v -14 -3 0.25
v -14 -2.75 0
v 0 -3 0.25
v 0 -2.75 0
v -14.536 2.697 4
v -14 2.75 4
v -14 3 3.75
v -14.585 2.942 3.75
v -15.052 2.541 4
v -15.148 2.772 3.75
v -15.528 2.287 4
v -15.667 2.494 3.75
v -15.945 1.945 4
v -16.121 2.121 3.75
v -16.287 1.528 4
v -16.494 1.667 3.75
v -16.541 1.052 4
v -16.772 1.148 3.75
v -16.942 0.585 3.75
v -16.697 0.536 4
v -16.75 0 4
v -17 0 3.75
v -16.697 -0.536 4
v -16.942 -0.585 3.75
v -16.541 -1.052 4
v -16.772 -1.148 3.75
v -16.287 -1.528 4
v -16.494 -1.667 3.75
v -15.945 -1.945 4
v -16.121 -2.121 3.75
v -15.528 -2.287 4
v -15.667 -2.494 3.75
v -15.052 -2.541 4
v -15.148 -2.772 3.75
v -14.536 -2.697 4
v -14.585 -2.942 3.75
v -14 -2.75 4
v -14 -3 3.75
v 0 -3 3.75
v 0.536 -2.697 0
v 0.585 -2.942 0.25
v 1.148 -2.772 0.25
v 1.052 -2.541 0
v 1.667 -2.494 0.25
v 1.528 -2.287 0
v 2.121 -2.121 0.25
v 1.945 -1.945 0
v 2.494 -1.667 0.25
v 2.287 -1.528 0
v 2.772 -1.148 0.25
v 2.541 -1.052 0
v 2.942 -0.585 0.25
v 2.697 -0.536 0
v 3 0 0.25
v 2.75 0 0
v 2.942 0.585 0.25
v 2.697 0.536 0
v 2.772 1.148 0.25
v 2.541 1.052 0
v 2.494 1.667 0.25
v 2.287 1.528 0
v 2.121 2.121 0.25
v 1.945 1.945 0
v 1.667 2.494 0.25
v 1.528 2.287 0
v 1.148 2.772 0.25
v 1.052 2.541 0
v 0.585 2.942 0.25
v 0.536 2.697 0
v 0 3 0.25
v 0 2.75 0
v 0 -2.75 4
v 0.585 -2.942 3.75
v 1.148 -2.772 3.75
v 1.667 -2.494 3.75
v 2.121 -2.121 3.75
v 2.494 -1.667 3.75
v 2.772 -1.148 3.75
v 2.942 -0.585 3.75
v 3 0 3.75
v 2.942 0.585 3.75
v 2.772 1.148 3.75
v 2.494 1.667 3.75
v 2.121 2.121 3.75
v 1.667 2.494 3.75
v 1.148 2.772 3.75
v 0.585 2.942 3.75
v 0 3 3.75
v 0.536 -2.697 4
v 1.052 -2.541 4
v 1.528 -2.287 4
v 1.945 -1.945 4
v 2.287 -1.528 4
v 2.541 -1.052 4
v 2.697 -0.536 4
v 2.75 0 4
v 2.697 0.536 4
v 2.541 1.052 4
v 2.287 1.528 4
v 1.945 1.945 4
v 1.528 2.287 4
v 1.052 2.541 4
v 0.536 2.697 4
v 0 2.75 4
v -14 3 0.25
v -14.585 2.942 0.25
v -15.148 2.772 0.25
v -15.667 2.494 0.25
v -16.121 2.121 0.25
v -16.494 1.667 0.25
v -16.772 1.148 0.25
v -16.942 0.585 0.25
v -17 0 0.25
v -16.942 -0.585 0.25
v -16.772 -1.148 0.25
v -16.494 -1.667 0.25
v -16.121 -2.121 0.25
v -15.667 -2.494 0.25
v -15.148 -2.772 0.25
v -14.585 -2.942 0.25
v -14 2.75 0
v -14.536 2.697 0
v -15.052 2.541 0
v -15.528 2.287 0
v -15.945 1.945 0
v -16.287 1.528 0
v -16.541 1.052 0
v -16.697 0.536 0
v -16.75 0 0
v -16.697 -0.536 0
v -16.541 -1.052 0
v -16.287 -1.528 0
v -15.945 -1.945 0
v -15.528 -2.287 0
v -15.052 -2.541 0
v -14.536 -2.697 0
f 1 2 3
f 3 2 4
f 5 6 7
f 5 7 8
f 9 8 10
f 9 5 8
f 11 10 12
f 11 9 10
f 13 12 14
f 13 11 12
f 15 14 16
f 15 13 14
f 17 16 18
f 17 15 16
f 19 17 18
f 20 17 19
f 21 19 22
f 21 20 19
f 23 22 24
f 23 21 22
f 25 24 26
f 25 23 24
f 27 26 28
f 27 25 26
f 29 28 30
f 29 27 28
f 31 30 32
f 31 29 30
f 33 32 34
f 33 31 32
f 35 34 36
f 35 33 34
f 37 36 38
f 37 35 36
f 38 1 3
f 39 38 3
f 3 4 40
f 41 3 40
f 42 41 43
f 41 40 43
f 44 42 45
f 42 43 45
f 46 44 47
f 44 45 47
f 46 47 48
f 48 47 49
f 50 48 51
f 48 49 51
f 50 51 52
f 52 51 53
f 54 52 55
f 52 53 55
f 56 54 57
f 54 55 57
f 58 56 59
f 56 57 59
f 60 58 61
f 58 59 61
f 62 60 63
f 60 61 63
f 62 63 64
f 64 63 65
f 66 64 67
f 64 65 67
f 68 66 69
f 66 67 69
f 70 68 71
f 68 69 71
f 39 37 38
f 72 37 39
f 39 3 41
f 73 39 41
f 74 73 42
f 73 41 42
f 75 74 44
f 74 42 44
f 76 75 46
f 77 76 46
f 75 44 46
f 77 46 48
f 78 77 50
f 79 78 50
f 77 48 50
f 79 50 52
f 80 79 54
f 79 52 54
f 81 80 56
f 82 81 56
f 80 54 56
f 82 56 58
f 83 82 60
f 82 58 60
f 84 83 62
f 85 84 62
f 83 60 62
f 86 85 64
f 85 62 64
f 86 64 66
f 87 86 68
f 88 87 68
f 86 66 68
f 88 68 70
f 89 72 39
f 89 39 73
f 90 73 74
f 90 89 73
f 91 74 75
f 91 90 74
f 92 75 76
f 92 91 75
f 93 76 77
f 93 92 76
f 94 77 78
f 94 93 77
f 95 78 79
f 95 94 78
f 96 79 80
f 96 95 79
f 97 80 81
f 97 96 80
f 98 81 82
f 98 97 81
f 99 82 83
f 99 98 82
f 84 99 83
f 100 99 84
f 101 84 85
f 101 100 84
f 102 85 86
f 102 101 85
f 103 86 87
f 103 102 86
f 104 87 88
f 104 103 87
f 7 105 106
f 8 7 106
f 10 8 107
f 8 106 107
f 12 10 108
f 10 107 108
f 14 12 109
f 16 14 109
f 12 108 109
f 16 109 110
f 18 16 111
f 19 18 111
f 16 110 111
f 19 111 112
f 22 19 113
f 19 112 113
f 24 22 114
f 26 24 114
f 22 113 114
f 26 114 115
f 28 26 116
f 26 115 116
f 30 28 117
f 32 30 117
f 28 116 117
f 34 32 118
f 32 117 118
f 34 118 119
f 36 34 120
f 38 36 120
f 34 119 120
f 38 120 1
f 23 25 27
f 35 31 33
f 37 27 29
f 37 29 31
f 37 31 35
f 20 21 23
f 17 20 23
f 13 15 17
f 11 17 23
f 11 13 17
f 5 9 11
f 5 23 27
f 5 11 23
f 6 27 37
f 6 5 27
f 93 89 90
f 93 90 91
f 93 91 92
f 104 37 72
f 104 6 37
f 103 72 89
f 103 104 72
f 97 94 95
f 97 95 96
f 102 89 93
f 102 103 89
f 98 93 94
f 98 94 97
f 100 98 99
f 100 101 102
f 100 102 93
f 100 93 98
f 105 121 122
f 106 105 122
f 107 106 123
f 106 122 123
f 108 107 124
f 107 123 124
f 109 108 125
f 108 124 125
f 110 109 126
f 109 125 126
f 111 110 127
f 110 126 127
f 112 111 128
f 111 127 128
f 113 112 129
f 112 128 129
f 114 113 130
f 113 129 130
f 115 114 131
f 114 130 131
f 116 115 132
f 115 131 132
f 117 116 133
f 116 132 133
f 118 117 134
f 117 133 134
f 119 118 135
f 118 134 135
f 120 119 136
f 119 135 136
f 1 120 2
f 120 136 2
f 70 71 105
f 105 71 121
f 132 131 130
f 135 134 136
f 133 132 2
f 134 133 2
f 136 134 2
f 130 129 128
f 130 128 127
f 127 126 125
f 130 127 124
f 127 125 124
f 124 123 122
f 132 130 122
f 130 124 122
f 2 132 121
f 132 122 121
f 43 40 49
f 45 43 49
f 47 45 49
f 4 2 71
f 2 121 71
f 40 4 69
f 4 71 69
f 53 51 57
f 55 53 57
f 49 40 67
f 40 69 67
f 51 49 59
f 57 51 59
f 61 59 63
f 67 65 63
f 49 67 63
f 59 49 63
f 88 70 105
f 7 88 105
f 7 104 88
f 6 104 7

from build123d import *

# Parameters (mm, degrees)
EXTRUDE1_DEPTH = 4
CHAMFER1_SIZE  = 0.25


with BuildPart() as part:
    # Sketch1 → Extrude1 (new body)
    with BuildSketch(Plane.XY):
        with BuildLine():
            Line((0, 3), (-14, 3))
            ThreePointArc((-14, 3), (-17, 0), (-14, -3))
            Line((-14, -3), (0, -3))
            ThreePointArc((0, -3), (3, 0), (0, 3))
        make_face()
    extrude(amount=EXTRUDE1_DEPTH)

    # Chamfer1
    chamfer1_edges = [part.edges().sort_by_distance(p)[0] for p in [
        (-17, 0, 4),
        (-7, -3, 4),
        (3, 0, 4),
        (-7, -3, 0),
        (-17, 0, 0),
        (-7, 3, 0),
        (3, 0, 0),
        (-7, 3, 4),
    ]]
    chamfer(chamfer1_edges, length=CHAMFER1_SIZE)


solid = part.part
